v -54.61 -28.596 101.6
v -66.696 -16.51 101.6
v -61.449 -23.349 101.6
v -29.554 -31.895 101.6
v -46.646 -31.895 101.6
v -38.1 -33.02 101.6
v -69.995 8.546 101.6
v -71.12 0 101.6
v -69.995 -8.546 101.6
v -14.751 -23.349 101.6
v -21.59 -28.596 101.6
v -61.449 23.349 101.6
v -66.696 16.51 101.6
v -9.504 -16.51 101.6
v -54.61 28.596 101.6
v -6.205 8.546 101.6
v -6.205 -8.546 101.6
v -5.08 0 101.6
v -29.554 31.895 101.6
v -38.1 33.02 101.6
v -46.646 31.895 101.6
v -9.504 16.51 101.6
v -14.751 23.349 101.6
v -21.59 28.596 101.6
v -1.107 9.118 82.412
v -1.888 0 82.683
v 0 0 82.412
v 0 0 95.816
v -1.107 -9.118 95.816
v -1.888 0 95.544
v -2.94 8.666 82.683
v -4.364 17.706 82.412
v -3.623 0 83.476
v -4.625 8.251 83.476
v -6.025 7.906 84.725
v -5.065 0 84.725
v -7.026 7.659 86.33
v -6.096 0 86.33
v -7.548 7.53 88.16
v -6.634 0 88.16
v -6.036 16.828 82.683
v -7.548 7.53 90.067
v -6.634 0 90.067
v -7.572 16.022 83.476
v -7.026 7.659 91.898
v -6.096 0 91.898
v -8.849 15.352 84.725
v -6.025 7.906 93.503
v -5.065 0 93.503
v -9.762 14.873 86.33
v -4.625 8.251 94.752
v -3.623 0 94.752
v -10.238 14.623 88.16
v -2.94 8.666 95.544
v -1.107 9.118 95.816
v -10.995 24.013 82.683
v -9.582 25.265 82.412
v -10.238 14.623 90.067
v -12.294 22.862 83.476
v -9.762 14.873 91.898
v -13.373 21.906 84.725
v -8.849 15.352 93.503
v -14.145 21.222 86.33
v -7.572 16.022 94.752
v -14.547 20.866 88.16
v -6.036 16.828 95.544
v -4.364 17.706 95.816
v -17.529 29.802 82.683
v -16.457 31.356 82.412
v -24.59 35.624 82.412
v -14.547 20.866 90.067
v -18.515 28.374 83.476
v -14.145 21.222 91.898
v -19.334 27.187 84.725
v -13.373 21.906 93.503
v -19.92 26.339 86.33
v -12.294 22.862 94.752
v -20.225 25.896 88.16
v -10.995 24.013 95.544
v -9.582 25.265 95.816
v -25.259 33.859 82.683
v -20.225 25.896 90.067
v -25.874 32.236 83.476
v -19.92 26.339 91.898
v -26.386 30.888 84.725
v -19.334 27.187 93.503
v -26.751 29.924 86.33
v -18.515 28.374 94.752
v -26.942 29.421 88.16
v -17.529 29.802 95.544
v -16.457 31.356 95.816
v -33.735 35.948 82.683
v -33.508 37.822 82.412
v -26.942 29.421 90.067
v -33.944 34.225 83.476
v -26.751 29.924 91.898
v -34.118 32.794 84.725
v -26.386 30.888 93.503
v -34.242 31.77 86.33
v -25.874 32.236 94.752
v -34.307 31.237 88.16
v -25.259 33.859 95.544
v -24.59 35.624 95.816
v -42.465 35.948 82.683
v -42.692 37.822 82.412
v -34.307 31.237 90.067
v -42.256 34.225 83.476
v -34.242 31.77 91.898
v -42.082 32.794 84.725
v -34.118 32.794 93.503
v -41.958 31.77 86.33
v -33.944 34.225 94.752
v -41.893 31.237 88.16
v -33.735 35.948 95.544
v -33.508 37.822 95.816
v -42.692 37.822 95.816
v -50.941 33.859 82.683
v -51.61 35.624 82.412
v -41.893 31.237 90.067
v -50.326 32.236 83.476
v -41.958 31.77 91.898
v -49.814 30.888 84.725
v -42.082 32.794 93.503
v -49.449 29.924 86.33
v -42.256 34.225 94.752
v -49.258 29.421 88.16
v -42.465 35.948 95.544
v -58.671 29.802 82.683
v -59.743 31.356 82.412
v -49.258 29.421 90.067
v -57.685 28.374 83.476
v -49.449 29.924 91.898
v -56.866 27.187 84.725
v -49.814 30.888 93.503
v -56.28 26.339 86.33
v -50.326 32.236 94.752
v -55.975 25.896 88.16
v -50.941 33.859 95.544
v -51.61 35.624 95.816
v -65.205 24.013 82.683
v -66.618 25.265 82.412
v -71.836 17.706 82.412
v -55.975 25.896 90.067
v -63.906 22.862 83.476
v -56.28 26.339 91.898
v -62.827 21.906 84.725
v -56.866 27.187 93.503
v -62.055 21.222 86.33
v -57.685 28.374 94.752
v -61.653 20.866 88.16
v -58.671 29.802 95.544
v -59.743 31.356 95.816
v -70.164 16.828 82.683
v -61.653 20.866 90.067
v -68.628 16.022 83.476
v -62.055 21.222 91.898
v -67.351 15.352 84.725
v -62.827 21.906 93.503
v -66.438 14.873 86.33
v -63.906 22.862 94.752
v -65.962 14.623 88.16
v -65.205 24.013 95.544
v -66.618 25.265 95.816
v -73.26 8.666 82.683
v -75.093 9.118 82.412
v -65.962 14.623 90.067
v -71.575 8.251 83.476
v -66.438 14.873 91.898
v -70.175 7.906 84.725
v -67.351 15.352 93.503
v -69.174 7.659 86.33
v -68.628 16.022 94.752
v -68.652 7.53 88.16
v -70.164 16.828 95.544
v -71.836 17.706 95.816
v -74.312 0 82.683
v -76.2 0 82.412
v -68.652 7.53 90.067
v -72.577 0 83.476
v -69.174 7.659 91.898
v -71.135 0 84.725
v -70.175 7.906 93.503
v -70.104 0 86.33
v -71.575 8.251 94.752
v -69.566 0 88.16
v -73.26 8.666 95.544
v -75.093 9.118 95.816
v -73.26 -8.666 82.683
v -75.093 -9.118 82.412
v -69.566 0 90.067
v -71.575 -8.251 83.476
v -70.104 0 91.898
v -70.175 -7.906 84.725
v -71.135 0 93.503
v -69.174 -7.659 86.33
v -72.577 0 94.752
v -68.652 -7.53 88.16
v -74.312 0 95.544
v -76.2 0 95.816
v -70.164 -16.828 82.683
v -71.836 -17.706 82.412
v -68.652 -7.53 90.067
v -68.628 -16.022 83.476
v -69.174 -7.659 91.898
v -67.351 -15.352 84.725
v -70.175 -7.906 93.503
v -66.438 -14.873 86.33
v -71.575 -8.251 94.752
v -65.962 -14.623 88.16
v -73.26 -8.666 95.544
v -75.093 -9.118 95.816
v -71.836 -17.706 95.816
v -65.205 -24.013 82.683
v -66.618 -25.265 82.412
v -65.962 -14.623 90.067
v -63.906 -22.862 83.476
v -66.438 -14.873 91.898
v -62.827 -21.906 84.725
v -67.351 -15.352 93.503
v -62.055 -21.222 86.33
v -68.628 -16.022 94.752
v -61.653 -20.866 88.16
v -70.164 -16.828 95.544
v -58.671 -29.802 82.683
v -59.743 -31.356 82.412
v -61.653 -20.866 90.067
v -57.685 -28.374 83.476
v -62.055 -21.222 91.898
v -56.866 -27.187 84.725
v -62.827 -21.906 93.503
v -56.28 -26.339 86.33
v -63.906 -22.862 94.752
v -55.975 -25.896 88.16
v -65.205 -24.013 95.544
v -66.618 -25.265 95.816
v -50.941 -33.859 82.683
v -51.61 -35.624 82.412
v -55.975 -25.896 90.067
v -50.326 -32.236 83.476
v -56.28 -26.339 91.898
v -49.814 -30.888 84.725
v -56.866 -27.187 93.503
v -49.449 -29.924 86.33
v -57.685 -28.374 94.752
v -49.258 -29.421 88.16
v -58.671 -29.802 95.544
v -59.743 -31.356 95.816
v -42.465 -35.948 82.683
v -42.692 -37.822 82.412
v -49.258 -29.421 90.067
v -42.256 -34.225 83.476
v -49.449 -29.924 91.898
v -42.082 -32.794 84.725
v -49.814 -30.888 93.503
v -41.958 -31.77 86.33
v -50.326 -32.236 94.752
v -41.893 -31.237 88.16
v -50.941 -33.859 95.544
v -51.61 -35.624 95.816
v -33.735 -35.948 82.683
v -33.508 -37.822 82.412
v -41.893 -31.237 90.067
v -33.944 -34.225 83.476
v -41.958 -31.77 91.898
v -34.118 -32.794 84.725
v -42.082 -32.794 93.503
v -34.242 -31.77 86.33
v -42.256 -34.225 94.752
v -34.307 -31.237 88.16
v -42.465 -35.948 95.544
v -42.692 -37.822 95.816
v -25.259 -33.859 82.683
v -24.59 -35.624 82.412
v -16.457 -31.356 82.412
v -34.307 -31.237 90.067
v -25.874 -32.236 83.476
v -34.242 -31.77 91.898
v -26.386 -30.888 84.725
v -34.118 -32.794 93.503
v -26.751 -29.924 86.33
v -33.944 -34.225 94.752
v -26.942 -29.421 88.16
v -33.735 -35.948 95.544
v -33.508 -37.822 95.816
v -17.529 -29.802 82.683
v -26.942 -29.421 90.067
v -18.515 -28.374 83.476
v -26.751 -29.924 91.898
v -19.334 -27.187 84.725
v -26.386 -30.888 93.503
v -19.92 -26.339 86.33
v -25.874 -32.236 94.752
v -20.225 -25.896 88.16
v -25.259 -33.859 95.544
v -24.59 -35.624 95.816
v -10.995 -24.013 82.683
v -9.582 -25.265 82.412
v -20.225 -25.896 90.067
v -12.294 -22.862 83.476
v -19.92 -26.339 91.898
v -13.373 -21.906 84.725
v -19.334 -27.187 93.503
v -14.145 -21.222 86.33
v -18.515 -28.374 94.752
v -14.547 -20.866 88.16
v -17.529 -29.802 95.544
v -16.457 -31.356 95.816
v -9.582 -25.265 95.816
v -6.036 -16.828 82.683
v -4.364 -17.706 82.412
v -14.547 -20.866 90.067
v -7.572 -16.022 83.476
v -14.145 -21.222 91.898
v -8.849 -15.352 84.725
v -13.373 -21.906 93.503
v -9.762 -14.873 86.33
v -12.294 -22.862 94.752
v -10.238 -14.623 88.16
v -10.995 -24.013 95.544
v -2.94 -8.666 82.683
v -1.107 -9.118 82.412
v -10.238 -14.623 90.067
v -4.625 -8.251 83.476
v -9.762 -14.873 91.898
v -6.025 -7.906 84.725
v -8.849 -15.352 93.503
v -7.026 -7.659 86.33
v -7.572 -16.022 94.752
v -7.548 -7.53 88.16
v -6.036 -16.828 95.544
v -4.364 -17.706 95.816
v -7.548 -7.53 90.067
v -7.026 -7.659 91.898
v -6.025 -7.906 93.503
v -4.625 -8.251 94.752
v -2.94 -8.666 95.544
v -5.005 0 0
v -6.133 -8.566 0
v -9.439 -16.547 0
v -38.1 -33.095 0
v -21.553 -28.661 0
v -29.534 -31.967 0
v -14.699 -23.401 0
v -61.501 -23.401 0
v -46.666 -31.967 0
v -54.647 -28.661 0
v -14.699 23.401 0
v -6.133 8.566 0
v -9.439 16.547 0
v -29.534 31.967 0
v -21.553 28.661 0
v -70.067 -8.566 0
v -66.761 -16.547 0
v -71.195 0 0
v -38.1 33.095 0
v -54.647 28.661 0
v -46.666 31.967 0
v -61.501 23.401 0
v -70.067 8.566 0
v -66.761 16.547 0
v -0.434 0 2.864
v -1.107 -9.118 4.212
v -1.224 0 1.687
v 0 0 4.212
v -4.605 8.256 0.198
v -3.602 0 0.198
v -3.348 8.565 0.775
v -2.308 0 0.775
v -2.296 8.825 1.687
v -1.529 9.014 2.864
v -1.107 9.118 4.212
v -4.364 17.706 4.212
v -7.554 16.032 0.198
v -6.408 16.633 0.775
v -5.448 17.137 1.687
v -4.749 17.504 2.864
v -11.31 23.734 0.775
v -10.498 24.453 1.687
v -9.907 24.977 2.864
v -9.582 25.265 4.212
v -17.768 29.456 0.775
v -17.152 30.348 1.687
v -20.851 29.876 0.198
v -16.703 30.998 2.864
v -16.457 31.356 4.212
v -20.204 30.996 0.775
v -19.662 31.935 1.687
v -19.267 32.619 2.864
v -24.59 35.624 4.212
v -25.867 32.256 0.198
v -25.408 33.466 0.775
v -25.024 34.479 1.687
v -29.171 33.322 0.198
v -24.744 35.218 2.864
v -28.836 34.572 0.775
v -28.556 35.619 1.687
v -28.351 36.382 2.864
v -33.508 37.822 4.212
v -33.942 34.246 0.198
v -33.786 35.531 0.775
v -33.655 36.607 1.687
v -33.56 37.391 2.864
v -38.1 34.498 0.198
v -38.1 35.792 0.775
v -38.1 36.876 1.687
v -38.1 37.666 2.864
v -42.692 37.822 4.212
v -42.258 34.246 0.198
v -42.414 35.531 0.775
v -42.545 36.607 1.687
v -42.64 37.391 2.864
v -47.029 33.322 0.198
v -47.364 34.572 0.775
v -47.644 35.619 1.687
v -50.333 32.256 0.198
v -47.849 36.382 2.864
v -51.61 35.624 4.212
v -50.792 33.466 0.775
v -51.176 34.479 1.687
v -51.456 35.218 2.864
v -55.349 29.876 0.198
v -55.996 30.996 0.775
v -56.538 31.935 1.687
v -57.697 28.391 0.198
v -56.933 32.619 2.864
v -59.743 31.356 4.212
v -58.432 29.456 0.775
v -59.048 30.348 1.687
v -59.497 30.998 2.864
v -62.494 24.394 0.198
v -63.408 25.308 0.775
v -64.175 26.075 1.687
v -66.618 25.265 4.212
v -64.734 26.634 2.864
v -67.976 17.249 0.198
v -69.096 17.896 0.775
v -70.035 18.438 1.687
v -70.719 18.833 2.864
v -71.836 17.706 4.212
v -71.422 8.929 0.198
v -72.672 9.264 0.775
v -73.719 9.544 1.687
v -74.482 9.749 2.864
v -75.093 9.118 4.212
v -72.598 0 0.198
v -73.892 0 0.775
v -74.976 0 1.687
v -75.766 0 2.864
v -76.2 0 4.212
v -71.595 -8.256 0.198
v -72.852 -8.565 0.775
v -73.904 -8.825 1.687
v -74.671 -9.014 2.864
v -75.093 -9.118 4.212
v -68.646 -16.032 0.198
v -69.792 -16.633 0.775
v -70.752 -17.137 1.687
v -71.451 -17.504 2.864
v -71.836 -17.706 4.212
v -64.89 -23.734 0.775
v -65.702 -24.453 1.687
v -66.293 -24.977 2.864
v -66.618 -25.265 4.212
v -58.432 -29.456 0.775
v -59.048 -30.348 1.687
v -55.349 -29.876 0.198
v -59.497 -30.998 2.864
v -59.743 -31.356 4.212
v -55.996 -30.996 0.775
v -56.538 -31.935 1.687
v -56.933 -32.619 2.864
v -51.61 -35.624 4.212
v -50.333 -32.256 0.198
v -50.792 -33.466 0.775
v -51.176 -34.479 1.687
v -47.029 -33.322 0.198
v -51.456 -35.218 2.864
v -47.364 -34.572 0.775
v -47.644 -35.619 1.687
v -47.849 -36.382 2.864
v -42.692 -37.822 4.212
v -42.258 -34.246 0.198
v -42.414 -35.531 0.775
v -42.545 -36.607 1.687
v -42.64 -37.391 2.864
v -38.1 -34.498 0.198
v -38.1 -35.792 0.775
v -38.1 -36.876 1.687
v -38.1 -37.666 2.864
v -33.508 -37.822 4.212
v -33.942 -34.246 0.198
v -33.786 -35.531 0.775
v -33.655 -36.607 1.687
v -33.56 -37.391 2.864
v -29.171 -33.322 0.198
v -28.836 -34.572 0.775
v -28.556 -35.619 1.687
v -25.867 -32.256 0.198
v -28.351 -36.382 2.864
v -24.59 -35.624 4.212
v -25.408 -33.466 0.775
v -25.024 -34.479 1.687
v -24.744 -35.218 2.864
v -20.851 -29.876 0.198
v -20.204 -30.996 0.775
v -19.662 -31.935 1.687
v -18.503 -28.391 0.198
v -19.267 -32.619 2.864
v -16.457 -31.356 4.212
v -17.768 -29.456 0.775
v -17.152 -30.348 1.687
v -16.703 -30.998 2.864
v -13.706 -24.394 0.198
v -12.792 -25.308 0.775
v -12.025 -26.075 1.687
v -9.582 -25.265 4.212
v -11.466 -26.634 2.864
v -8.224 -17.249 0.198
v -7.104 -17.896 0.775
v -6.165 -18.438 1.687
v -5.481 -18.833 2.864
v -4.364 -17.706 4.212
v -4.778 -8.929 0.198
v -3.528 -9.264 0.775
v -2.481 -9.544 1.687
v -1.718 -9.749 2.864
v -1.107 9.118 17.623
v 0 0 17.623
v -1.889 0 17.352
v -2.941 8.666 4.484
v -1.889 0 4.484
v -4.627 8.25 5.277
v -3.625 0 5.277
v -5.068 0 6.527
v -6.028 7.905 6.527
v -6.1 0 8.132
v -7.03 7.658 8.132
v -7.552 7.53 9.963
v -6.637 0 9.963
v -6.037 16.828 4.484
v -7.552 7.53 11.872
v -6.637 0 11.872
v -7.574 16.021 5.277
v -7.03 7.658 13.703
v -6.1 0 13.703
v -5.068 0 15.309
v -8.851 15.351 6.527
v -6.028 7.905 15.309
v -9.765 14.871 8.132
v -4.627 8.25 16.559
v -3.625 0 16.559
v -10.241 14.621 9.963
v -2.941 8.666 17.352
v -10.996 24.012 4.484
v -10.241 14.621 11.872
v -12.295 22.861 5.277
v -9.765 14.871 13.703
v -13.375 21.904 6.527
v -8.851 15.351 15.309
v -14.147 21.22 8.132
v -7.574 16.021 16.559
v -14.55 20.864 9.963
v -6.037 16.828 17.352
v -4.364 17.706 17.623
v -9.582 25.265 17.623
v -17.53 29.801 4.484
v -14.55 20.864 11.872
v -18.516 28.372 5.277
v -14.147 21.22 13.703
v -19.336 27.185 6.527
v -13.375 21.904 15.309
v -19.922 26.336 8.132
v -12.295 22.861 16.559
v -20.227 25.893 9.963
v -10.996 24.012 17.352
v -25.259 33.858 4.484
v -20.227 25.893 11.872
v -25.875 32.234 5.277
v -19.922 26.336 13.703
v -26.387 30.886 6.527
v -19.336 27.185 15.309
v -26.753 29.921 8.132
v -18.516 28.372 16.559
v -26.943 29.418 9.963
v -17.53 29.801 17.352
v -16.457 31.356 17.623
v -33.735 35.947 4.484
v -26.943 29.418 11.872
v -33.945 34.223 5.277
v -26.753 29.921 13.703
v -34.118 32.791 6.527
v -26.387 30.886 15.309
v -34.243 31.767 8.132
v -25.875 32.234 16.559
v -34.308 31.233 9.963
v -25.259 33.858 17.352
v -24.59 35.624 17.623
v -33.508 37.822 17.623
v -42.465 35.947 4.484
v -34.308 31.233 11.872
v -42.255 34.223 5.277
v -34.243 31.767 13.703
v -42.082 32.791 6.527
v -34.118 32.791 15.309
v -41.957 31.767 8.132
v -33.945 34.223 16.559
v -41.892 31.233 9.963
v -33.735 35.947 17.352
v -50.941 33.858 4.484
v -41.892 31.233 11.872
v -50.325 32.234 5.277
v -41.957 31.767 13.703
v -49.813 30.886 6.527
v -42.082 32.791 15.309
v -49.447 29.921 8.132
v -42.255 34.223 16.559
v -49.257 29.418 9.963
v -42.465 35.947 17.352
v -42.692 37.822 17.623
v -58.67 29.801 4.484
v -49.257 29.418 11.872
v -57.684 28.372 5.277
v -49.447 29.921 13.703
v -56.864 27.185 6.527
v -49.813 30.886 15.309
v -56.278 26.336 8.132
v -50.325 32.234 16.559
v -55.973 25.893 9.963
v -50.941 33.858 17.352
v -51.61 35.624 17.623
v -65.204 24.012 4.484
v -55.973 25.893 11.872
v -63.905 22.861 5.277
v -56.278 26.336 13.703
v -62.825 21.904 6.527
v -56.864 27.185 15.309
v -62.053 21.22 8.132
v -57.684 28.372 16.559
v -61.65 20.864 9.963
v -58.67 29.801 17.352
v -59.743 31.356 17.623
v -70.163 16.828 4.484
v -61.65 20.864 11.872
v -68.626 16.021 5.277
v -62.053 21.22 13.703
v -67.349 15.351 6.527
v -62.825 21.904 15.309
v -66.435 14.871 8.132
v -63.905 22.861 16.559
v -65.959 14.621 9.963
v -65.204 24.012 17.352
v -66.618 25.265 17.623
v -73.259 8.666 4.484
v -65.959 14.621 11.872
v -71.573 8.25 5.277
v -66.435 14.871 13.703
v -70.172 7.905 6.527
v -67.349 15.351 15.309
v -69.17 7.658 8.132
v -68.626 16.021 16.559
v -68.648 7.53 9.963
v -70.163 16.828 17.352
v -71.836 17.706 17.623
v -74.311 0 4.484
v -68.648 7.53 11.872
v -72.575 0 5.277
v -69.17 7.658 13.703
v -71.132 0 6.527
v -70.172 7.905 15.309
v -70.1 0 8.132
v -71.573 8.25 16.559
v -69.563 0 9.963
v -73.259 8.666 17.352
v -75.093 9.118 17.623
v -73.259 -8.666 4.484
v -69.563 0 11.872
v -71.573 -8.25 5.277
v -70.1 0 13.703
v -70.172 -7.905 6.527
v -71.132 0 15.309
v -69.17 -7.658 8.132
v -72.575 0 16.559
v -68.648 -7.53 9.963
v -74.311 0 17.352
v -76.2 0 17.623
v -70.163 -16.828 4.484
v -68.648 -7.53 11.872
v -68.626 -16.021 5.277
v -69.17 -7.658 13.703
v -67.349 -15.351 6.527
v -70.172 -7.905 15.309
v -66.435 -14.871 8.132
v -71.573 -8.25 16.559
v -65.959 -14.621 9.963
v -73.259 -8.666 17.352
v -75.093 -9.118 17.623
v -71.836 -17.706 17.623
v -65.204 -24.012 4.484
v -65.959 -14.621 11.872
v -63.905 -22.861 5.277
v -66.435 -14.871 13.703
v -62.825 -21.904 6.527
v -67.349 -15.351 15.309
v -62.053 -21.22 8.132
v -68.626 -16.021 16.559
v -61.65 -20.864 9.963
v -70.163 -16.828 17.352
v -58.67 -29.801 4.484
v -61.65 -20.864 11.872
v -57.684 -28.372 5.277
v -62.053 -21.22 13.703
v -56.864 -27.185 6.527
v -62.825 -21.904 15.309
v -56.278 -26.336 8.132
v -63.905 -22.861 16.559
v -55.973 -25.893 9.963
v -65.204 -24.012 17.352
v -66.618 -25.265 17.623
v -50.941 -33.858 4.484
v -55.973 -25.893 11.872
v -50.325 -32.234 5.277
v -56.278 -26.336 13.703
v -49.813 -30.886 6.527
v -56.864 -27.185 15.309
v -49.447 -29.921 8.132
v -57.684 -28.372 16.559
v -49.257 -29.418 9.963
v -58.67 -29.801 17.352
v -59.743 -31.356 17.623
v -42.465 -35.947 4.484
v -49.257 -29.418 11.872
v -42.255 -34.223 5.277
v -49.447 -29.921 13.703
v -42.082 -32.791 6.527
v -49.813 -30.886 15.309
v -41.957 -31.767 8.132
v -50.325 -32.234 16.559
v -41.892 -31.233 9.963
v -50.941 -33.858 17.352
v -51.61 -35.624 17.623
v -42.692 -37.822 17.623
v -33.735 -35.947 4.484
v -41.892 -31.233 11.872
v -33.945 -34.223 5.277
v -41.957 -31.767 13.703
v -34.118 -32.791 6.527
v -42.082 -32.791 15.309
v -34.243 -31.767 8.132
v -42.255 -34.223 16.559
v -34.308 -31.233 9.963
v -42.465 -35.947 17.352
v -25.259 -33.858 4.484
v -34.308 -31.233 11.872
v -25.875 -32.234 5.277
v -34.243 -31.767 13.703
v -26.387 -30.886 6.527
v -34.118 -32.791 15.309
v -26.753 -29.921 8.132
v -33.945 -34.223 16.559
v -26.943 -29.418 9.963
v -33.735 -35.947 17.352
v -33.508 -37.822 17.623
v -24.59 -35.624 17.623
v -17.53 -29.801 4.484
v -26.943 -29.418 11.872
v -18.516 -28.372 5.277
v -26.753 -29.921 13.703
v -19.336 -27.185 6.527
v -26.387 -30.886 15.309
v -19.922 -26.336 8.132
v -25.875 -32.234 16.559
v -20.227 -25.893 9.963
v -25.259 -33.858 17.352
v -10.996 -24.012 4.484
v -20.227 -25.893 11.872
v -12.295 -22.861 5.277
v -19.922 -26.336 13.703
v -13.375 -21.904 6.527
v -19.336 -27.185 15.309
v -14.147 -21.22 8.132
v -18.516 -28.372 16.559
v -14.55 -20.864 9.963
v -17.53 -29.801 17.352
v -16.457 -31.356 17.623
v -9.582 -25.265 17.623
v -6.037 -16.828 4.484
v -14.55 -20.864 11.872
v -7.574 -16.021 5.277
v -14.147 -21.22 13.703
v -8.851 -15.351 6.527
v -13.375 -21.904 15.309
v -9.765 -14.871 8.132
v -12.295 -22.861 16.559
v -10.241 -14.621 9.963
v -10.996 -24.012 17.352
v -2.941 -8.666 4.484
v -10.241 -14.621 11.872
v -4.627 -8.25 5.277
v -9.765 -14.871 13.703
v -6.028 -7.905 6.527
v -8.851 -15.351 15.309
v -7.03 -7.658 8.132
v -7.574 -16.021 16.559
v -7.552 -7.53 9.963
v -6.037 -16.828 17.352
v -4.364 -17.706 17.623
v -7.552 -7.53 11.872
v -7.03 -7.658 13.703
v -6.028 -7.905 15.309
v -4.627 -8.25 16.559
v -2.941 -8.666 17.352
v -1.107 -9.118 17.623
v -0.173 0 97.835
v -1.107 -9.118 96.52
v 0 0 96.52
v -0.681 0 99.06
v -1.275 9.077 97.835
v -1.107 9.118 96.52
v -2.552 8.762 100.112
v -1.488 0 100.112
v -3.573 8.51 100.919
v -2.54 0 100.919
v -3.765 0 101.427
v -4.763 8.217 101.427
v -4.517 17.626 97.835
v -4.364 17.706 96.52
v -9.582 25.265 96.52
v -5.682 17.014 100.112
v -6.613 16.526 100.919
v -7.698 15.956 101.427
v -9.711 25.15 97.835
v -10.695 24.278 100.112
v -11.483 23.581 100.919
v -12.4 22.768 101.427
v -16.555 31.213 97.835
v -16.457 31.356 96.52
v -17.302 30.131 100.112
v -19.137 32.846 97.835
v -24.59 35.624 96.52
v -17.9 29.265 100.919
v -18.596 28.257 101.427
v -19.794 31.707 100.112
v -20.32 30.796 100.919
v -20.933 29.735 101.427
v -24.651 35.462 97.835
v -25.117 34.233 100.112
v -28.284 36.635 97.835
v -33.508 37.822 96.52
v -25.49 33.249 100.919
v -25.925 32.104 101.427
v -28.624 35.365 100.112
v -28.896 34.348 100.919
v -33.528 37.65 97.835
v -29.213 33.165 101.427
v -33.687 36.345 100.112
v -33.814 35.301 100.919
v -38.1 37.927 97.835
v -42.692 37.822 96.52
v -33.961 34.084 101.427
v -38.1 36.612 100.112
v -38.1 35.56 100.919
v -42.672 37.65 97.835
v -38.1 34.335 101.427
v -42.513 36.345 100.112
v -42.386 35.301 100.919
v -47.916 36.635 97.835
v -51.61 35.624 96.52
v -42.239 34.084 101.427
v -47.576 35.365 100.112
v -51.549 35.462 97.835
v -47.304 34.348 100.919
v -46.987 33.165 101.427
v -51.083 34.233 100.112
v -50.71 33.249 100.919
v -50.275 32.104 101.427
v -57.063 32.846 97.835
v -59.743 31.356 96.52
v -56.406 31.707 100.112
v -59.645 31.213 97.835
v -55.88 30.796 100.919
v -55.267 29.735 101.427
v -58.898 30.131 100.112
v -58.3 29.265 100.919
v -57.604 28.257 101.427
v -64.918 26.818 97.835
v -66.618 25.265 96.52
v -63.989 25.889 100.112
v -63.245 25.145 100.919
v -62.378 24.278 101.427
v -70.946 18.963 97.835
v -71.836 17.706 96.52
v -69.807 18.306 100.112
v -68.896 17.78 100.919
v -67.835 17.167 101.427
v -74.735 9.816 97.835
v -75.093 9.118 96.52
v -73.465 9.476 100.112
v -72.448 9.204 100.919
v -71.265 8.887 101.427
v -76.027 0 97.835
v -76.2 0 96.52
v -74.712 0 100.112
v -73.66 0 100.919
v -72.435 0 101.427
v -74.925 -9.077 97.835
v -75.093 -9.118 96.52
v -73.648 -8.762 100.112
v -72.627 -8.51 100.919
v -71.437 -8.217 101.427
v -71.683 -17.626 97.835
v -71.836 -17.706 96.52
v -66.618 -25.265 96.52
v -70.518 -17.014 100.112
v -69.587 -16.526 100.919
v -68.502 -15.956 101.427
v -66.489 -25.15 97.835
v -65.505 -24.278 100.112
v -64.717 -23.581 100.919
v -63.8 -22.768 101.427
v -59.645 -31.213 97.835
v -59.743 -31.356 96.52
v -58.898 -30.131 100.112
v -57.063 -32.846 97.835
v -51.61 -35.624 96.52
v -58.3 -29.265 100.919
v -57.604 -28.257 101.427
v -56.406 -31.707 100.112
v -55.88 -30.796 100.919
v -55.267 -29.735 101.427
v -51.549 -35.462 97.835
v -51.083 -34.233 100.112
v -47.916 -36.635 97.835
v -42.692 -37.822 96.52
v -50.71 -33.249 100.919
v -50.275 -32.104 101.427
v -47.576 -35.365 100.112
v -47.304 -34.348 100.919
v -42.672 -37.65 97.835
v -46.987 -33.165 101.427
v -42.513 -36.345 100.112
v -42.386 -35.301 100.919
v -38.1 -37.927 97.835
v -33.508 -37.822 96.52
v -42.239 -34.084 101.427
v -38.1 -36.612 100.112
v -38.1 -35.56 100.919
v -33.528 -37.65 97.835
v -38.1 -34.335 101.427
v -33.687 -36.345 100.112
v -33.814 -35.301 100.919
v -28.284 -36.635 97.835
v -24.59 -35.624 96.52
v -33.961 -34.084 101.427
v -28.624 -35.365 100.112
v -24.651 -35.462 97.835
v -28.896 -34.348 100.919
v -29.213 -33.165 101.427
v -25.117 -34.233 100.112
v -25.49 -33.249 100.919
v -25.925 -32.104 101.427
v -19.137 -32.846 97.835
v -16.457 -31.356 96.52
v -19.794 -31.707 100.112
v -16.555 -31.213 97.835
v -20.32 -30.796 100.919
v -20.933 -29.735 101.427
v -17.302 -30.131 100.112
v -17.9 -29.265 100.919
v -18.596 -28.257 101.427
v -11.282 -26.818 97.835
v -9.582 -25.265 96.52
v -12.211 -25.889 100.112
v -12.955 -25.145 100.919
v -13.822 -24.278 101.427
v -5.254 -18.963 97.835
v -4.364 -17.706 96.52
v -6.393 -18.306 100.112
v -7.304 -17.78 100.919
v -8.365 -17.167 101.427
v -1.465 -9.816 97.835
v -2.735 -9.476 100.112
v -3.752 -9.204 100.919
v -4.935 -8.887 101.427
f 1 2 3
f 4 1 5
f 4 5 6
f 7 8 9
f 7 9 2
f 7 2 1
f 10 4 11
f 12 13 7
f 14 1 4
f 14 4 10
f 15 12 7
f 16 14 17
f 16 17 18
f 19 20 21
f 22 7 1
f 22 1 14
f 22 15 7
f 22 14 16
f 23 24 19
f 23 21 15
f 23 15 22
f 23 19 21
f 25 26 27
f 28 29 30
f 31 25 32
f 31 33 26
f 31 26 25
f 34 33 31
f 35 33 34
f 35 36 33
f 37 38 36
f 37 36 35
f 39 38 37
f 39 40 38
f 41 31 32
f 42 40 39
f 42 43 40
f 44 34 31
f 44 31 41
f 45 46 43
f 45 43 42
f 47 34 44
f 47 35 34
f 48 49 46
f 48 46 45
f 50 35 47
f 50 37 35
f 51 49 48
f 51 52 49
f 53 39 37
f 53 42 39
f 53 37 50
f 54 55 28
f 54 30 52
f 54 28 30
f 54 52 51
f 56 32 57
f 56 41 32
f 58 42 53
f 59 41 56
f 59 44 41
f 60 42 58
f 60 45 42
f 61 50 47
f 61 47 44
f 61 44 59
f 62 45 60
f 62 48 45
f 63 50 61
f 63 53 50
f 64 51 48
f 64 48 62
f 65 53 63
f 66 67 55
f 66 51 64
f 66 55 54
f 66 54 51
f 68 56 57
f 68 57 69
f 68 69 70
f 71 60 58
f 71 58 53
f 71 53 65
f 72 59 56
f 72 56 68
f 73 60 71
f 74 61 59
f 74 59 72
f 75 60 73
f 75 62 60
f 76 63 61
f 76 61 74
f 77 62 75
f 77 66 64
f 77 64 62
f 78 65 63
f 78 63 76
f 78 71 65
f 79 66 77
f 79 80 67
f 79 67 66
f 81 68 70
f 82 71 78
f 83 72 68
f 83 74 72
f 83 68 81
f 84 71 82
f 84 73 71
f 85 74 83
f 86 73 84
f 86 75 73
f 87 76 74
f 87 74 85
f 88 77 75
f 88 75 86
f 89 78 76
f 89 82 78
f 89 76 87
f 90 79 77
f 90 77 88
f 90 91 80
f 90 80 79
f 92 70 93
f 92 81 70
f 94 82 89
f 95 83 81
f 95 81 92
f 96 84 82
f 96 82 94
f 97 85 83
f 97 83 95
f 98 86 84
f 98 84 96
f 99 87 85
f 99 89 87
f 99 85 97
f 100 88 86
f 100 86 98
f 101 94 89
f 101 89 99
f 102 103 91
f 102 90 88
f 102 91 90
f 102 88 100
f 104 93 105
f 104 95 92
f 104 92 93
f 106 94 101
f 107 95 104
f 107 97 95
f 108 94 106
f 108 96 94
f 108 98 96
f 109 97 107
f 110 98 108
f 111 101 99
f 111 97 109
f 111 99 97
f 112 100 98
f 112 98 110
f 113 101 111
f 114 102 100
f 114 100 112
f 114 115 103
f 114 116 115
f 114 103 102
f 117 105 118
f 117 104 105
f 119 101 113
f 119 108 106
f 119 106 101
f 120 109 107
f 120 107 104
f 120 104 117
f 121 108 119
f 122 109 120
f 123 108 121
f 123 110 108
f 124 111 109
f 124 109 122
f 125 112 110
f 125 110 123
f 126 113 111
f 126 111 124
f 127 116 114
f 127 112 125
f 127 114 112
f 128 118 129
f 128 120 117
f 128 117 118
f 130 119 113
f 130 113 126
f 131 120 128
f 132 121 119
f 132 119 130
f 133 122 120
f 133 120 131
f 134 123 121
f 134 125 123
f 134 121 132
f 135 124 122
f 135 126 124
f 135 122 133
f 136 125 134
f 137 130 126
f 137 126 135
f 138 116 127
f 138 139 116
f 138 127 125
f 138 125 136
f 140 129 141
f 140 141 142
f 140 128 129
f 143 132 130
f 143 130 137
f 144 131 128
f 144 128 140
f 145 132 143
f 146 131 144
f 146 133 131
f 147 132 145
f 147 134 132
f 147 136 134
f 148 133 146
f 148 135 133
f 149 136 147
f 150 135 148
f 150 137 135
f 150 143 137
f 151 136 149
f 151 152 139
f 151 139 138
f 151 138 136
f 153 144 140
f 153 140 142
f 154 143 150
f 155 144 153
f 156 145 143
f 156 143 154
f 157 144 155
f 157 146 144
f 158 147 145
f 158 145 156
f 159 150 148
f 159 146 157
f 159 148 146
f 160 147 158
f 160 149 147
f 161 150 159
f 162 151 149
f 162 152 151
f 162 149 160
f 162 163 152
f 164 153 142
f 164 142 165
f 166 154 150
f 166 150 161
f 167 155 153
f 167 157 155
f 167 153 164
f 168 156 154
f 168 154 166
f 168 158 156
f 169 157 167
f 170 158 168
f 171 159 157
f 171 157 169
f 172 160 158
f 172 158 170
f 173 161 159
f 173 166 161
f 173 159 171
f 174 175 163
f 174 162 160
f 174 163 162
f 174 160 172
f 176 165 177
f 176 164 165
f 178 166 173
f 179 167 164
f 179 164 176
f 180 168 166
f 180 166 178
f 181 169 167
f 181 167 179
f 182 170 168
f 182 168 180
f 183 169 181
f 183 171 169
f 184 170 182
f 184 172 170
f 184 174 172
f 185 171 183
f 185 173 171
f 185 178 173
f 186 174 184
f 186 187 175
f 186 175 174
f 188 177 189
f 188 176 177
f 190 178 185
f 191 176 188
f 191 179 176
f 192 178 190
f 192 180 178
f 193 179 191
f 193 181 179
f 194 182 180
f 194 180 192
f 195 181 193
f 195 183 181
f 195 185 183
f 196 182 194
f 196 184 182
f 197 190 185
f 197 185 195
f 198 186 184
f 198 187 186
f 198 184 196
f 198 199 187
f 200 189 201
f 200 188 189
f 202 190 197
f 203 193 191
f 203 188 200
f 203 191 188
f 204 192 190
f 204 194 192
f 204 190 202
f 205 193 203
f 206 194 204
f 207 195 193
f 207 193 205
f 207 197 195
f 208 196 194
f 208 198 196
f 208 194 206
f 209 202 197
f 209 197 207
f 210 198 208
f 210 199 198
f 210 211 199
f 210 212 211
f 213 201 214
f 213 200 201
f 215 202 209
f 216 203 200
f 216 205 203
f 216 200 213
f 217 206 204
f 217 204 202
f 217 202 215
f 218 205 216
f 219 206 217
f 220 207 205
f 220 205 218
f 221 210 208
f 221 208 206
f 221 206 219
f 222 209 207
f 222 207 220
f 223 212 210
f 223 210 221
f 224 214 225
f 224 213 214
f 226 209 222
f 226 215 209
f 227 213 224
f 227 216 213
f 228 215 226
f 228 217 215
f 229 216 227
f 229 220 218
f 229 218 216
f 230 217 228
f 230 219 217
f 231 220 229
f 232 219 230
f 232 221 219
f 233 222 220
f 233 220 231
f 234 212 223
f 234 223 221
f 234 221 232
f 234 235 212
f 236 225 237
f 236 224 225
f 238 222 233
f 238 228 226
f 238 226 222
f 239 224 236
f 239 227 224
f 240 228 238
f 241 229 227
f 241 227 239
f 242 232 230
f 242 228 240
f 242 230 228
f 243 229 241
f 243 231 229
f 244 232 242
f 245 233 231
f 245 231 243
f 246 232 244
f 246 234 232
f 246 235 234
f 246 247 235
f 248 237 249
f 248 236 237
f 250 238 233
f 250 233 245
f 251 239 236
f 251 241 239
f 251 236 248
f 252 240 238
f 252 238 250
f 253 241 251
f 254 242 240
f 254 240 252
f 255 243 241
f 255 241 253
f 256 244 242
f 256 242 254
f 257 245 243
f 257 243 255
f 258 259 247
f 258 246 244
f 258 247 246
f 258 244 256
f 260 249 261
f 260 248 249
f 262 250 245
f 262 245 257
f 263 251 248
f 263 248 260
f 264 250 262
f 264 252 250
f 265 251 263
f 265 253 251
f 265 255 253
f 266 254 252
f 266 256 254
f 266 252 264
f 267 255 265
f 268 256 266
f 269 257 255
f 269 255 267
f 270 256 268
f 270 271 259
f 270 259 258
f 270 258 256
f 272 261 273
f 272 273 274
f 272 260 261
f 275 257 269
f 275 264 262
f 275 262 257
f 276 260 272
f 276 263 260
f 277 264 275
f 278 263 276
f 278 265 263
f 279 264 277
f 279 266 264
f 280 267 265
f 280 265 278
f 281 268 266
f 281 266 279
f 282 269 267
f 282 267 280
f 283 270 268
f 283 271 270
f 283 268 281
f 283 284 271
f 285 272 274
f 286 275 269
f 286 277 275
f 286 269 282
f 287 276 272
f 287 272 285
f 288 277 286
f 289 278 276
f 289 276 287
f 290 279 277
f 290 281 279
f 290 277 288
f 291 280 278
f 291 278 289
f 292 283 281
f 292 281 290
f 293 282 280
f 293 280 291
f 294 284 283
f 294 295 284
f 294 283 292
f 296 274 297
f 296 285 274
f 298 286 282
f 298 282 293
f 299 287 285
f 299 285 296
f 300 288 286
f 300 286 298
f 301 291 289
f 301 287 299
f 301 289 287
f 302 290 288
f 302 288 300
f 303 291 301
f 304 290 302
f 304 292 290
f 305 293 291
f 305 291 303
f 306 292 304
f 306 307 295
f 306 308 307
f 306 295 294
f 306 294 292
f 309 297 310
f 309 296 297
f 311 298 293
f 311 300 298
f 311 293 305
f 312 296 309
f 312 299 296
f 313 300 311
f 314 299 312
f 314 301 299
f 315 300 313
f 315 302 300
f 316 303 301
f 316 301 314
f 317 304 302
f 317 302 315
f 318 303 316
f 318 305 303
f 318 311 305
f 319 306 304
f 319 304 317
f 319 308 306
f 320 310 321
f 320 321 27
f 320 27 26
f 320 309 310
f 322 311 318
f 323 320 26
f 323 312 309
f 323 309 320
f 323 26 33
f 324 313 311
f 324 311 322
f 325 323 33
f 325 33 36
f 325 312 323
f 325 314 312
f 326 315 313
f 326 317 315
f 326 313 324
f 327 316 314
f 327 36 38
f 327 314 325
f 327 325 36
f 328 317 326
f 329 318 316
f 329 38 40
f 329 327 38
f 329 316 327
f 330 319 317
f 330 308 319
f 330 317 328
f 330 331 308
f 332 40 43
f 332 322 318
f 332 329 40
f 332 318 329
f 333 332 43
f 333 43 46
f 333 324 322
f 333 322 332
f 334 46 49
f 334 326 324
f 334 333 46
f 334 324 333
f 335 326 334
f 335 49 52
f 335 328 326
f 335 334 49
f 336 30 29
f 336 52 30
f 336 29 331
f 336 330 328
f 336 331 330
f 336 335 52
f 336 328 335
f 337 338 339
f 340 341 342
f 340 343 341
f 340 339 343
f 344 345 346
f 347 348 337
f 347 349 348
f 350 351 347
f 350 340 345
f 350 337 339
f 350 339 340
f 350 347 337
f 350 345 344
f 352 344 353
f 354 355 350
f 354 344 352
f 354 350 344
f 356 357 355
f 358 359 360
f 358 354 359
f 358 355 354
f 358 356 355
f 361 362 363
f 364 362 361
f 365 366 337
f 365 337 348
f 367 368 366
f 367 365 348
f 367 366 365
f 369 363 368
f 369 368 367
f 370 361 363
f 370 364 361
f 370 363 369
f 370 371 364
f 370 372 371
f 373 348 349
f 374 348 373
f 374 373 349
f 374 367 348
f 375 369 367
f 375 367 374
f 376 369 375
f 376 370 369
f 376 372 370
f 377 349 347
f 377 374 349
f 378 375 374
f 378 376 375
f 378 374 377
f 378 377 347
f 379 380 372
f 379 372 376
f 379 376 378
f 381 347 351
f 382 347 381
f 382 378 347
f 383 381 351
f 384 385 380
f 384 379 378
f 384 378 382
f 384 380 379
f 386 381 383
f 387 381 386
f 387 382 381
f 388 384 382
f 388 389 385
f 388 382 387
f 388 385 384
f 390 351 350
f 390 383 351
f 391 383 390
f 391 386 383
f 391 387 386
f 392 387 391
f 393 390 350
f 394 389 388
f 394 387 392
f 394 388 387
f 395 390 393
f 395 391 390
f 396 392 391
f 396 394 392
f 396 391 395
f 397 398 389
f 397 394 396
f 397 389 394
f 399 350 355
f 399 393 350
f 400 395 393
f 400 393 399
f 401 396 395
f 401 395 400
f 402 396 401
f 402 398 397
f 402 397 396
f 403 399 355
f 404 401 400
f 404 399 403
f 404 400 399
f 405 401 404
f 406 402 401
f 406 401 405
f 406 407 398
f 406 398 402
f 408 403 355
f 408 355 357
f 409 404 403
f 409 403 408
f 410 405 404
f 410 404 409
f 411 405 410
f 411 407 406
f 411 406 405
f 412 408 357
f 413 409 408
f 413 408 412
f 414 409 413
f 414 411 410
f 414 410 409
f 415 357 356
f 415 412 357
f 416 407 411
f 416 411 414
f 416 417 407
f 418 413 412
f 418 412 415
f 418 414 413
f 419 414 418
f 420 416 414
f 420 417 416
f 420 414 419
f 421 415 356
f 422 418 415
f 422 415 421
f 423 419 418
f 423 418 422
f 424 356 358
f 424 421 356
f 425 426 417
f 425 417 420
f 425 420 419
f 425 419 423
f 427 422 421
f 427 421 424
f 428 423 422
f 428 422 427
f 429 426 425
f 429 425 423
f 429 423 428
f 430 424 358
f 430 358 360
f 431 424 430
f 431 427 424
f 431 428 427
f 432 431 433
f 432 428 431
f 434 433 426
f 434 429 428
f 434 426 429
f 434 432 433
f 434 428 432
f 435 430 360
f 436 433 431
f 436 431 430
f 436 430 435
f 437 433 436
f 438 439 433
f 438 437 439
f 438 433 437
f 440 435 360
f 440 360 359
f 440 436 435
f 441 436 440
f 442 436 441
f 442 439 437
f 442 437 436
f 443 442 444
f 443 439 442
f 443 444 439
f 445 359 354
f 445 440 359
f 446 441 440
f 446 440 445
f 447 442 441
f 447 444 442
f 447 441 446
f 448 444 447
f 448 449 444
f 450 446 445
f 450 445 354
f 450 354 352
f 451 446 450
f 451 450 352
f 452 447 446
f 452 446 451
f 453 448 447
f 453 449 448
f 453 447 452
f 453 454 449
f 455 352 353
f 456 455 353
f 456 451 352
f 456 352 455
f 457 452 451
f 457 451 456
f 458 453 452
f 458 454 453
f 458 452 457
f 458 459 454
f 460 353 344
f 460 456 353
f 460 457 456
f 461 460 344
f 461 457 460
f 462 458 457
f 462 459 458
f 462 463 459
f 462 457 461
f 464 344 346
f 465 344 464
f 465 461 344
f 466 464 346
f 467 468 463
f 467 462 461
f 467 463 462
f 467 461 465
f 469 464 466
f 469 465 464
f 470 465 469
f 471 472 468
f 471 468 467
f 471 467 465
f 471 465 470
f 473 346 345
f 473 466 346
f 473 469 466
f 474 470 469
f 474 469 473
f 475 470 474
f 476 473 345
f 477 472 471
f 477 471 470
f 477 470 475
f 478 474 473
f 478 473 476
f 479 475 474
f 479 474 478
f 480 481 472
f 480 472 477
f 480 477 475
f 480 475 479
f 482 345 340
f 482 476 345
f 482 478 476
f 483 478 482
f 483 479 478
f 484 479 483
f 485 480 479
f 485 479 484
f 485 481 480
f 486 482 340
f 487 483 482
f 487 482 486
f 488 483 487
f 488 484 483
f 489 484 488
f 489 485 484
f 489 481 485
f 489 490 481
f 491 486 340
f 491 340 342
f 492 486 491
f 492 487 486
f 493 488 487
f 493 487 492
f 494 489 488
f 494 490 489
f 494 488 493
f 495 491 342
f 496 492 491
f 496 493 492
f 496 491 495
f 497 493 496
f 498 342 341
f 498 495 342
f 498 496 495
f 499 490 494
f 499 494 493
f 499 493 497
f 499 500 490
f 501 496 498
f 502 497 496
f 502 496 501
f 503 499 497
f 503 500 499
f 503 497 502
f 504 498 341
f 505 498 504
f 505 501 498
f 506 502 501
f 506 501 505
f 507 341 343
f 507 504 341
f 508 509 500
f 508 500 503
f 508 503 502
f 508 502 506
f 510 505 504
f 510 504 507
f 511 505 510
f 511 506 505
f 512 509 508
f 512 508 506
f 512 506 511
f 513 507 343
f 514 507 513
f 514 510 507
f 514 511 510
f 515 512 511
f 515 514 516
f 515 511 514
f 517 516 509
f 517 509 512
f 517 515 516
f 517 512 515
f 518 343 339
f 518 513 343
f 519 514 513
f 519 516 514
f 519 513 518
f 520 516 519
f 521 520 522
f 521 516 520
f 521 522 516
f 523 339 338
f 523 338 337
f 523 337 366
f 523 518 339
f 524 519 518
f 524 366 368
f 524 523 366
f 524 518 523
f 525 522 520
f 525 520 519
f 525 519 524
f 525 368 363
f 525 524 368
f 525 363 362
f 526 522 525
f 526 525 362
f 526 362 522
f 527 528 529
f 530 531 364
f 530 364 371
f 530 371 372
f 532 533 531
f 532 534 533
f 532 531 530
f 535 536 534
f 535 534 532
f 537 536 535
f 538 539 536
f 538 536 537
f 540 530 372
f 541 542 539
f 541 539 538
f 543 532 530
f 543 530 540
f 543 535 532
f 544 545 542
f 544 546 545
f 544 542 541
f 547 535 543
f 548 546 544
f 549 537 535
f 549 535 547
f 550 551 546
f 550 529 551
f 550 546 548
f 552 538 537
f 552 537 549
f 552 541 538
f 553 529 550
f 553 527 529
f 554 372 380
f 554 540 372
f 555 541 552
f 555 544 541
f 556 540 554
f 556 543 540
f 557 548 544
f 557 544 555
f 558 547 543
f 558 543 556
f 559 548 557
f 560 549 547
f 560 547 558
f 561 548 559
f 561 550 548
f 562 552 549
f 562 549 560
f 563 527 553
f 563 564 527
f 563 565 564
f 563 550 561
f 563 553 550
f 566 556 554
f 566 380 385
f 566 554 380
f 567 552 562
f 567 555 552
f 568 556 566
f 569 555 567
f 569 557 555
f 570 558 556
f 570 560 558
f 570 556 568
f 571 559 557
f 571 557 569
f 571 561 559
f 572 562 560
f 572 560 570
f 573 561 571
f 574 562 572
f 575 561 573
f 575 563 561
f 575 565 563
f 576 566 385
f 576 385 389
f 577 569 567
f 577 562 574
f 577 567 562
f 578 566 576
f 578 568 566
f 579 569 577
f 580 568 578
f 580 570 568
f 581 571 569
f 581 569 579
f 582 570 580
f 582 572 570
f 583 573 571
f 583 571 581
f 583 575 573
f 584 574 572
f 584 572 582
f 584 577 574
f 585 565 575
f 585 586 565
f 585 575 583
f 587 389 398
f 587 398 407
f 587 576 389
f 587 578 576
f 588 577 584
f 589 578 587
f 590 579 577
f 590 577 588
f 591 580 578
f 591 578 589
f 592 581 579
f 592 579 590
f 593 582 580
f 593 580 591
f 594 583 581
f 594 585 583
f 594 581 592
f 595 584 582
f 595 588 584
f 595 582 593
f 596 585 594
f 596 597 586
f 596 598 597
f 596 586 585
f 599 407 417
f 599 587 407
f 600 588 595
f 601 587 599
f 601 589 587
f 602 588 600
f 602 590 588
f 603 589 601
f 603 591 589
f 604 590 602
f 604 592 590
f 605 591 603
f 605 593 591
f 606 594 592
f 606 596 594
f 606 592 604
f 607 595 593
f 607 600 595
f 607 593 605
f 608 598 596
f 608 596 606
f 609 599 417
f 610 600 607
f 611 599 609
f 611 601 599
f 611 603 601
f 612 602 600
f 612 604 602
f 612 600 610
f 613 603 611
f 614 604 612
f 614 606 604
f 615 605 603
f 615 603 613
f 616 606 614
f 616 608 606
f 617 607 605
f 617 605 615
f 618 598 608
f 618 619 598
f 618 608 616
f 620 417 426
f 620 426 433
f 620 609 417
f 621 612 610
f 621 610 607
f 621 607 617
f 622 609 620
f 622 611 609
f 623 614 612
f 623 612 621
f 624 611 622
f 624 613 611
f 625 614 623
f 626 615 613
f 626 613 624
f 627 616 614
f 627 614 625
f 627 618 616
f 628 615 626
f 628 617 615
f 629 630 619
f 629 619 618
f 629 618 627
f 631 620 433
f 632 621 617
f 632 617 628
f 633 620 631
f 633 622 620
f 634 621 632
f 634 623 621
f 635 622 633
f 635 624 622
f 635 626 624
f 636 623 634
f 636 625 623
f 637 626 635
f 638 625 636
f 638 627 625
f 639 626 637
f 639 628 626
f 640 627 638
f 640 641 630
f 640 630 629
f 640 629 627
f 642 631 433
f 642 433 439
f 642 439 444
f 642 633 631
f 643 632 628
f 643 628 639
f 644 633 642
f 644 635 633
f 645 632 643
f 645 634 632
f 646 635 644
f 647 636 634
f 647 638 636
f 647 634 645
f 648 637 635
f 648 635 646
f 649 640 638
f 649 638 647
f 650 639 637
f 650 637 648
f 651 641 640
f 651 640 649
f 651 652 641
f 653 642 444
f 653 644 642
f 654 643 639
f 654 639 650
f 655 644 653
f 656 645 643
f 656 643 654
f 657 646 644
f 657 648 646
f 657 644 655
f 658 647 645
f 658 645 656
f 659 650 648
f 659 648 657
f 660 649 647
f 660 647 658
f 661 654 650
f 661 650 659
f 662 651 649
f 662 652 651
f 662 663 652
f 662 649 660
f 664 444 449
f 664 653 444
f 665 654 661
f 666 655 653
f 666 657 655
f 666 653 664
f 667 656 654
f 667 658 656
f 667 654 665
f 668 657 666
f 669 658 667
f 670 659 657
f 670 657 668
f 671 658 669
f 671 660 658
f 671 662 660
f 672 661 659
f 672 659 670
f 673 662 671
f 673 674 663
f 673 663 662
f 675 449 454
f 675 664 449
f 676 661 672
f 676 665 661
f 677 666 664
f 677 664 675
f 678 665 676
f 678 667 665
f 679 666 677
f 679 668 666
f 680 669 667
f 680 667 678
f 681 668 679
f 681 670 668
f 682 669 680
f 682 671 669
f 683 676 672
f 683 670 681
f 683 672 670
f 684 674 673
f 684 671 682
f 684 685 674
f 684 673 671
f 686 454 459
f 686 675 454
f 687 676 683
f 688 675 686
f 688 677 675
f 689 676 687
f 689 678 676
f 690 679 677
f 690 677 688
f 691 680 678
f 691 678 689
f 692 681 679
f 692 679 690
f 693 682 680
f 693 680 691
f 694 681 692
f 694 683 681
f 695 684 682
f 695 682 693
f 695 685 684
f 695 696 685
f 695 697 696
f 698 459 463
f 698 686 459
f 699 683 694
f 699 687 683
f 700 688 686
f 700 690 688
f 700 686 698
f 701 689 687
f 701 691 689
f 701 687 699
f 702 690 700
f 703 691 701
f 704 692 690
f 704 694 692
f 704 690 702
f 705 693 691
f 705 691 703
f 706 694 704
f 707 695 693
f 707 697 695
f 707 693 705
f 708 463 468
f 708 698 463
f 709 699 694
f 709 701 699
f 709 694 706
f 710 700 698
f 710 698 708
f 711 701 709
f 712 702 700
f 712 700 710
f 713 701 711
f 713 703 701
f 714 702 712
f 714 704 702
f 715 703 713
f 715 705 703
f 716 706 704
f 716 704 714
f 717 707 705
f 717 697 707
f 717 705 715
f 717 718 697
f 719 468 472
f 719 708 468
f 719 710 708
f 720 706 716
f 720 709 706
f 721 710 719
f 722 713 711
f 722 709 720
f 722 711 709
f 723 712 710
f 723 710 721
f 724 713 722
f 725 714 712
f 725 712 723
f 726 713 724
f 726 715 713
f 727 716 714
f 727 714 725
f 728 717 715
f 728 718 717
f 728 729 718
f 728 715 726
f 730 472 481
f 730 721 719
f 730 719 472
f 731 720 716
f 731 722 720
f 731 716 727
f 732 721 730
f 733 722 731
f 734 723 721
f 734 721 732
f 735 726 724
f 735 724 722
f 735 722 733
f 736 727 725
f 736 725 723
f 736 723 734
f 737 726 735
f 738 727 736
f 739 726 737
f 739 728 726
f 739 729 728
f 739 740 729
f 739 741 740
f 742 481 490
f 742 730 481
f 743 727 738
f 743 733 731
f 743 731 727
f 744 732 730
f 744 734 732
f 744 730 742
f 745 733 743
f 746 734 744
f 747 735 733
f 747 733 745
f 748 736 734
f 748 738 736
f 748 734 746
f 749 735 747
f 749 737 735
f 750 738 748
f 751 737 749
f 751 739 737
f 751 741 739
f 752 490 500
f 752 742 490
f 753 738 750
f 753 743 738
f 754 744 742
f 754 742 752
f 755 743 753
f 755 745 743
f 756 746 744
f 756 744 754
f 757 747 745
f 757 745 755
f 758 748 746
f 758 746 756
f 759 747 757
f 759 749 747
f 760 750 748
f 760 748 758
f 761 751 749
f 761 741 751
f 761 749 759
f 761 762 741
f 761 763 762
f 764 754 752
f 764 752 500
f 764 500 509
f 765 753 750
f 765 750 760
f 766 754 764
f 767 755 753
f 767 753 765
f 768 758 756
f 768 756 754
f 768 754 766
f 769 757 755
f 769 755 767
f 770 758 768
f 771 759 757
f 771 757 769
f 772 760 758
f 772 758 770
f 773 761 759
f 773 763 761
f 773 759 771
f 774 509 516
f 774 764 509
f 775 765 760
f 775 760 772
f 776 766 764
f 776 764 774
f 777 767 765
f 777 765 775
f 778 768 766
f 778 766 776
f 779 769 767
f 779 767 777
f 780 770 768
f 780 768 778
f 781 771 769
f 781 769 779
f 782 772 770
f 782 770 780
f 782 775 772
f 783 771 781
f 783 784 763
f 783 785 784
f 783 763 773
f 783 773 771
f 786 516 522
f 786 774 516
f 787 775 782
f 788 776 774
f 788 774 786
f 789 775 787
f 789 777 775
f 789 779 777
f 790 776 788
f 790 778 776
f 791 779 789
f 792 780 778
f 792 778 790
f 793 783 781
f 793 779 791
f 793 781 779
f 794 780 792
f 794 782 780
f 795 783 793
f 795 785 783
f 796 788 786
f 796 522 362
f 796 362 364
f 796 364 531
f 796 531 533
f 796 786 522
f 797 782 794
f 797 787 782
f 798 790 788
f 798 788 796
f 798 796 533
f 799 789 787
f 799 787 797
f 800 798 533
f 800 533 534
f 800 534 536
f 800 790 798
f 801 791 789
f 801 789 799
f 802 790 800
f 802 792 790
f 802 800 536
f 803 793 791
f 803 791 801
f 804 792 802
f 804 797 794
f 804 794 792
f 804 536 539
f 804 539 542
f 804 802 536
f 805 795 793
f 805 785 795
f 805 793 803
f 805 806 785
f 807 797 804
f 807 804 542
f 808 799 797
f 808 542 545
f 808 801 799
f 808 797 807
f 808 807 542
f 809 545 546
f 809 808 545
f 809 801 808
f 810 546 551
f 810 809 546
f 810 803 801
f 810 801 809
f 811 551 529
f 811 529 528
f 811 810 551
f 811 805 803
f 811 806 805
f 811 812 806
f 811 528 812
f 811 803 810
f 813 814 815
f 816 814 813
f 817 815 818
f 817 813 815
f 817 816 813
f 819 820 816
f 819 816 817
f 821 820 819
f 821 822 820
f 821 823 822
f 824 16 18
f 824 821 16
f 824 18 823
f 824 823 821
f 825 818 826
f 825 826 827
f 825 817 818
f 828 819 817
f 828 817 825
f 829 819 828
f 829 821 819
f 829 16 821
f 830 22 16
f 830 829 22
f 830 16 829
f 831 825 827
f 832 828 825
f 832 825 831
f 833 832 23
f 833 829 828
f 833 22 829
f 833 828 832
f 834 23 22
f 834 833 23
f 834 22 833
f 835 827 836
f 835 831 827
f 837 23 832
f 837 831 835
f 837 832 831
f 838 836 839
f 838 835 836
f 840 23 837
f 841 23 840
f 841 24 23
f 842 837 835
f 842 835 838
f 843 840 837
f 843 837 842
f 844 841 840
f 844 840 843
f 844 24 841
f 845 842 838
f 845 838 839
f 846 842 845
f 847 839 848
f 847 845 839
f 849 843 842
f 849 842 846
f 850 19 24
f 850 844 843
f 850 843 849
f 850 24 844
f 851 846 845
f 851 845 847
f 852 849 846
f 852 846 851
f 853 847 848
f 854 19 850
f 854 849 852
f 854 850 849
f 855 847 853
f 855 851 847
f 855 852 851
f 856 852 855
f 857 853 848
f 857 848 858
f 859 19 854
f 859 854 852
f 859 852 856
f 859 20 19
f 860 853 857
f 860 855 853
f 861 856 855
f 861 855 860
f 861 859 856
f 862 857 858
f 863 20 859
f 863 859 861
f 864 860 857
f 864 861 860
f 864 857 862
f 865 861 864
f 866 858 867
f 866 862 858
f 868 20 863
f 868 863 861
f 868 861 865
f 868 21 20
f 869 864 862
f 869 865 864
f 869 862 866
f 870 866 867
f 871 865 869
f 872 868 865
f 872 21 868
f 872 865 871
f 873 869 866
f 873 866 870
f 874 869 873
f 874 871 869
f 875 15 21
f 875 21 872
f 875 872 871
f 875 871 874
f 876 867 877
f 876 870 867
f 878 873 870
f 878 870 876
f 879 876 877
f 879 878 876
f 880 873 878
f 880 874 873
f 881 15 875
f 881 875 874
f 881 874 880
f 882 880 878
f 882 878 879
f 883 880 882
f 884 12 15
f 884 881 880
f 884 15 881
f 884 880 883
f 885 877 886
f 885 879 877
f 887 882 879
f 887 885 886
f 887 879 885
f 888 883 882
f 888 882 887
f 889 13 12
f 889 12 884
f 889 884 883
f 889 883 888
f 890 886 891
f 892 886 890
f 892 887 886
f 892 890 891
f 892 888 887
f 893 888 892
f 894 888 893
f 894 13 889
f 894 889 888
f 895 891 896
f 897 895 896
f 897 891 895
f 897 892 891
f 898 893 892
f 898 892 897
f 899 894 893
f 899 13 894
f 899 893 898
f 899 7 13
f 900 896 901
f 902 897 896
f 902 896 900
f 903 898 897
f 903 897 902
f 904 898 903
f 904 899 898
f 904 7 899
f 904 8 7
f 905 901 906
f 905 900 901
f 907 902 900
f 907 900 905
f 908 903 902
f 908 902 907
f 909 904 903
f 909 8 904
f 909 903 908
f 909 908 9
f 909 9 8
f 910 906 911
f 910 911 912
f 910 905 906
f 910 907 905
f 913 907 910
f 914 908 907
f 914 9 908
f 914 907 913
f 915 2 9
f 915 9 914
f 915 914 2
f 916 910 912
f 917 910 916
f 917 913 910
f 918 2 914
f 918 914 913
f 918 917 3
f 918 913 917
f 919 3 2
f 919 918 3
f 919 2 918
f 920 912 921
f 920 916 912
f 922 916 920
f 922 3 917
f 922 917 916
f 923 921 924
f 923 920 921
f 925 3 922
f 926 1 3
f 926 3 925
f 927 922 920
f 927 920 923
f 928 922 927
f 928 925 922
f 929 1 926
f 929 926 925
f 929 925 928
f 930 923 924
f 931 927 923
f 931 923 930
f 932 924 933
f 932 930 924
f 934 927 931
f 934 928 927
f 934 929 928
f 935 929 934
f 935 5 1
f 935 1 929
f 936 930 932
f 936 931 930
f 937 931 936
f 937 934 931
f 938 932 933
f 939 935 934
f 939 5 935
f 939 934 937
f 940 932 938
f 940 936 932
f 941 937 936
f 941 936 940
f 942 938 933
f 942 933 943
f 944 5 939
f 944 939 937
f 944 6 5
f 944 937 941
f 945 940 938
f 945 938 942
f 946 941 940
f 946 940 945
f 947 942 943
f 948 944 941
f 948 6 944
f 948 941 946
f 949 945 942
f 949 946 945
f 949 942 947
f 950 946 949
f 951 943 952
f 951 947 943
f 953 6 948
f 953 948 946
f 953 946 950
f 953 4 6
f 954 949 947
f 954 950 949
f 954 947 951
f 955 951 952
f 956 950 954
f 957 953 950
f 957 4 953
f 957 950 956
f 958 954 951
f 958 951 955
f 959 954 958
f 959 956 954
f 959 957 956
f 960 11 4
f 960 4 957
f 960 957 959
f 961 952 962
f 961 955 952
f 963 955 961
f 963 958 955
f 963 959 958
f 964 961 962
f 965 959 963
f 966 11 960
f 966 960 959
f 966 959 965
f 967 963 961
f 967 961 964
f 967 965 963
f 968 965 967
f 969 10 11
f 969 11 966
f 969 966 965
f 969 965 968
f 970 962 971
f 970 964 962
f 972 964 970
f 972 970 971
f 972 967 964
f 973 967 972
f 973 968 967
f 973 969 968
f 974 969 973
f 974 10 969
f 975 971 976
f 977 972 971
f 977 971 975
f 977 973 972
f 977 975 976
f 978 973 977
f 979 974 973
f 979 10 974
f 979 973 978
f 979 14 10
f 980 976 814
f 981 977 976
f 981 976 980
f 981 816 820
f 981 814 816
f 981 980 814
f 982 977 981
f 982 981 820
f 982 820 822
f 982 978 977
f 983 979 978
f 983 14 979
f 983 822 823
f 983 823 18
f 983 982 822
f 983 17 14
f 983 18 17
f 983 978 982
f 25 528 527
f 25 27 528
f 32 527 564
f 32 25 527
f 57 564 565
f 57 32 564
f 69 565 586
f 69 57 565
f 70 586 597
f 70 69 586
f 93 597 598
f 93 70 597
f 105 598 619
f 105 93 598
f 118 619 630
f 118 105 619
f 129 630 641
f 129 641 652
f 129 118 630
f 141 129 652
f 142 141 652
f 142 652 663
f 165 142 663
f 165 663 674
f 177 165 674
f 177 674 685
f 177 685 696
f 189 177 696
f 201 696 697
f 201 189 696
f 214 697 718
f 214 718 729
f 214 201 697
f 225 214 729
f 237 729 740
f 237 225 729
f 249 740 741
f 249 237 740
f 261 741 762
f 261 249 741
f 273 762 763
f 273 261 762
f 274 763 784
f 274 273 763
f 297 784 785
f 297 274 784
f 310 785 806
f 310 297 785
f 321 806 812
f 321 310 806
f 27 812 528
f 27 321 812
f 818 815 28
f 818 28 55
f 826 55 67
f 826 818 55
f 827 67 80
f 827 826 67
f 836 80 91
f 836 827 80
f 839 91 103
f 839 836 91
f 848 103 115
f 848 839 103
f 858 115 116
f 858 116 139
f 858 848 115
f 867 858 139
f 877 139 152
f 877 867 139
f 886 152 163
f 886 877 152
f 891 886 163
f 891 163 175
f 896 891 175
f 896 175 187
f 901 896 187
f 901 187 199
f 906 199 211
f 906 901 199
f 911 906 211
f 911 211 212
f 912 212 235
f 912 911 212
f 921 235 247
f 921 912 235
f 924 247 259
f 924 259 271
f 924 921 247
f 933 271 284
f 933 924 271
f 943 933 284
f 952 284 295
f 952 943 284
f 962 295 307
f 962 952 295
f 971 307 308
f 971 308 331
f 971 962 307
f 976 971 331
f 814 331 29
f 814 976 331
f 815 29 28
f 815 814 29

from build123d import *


# Not quite as in the source:
# - a fillet or chamfer that OpenCascade refuses, or shapes differently, is made with other operations: its cross-section is extruded or revolved along the edge and cut away or added


with BuildPart() as f1:
    # F0 (on Front) → F1 (revolve)
    with BuildSketch(Plane.XZ):
        with BuildLine():
            Line((-38.1, 0), (0, 0))
            Line((0, 0), (0, 4.2121557752))
            ThreePointArc((0, 4.2121557752), (-6.7056, 10.9177557752), (0, 17.6233557752))
            Line((0, 17.6233557752), (0, 82.4117260776))
            ThreePointArc((0, 82.4117260776), (-6.7019564309, 89.1136825085), (0, 95.8156389394))
            Line((0, 95.8156389394), (0, 101.6))
            Line((0, 101.6), (-38.1, 101.6))
            Line((-38.1, 101.6), (-38.1, 0))
        make_face()
    revolve(axis=Axis((-38.1, 0, 50.8), (0, 0, 1)))

    # F2: fillet of radius 5.08 on 2 edges, made by hand

    # F2_s1 → F2_t2 (revolve, cut)
    with BuildSketch(Plane.XZ):
        with BuildLine():
            ThreePointArc((0, 96.52), (-1.4878975516, 100.1121024484), (-5.08, 101.6))
            Line((-5.08, 101.6), (0, 101.6))
            Line((0, 101.6), (0, 96.52))
        make_face()
    revolve(axis=Axis((-38.1, 0, 101.6), (0, 0, 1)), mode=Mode.SUBTRACT)

    # F2_s3 → F2_t4 (revolve, cut)
    with BuildSketch(Plane.XZ):
        with BuildLine():
            ThreePointArc((-5.005321808, 0), (-1.7344082248, 1.1931601099), (0, 4.2121557752))
            Line((0, 4.2121557752), (0, 0))
            Line((0, 0), (-5.005321808, 0))
        make_face()
    revolve(axis=Axis((-38.1, 0, 0), (0, 0, 1)), mode=Mode.SUBTRACT)


solid = f1.part
